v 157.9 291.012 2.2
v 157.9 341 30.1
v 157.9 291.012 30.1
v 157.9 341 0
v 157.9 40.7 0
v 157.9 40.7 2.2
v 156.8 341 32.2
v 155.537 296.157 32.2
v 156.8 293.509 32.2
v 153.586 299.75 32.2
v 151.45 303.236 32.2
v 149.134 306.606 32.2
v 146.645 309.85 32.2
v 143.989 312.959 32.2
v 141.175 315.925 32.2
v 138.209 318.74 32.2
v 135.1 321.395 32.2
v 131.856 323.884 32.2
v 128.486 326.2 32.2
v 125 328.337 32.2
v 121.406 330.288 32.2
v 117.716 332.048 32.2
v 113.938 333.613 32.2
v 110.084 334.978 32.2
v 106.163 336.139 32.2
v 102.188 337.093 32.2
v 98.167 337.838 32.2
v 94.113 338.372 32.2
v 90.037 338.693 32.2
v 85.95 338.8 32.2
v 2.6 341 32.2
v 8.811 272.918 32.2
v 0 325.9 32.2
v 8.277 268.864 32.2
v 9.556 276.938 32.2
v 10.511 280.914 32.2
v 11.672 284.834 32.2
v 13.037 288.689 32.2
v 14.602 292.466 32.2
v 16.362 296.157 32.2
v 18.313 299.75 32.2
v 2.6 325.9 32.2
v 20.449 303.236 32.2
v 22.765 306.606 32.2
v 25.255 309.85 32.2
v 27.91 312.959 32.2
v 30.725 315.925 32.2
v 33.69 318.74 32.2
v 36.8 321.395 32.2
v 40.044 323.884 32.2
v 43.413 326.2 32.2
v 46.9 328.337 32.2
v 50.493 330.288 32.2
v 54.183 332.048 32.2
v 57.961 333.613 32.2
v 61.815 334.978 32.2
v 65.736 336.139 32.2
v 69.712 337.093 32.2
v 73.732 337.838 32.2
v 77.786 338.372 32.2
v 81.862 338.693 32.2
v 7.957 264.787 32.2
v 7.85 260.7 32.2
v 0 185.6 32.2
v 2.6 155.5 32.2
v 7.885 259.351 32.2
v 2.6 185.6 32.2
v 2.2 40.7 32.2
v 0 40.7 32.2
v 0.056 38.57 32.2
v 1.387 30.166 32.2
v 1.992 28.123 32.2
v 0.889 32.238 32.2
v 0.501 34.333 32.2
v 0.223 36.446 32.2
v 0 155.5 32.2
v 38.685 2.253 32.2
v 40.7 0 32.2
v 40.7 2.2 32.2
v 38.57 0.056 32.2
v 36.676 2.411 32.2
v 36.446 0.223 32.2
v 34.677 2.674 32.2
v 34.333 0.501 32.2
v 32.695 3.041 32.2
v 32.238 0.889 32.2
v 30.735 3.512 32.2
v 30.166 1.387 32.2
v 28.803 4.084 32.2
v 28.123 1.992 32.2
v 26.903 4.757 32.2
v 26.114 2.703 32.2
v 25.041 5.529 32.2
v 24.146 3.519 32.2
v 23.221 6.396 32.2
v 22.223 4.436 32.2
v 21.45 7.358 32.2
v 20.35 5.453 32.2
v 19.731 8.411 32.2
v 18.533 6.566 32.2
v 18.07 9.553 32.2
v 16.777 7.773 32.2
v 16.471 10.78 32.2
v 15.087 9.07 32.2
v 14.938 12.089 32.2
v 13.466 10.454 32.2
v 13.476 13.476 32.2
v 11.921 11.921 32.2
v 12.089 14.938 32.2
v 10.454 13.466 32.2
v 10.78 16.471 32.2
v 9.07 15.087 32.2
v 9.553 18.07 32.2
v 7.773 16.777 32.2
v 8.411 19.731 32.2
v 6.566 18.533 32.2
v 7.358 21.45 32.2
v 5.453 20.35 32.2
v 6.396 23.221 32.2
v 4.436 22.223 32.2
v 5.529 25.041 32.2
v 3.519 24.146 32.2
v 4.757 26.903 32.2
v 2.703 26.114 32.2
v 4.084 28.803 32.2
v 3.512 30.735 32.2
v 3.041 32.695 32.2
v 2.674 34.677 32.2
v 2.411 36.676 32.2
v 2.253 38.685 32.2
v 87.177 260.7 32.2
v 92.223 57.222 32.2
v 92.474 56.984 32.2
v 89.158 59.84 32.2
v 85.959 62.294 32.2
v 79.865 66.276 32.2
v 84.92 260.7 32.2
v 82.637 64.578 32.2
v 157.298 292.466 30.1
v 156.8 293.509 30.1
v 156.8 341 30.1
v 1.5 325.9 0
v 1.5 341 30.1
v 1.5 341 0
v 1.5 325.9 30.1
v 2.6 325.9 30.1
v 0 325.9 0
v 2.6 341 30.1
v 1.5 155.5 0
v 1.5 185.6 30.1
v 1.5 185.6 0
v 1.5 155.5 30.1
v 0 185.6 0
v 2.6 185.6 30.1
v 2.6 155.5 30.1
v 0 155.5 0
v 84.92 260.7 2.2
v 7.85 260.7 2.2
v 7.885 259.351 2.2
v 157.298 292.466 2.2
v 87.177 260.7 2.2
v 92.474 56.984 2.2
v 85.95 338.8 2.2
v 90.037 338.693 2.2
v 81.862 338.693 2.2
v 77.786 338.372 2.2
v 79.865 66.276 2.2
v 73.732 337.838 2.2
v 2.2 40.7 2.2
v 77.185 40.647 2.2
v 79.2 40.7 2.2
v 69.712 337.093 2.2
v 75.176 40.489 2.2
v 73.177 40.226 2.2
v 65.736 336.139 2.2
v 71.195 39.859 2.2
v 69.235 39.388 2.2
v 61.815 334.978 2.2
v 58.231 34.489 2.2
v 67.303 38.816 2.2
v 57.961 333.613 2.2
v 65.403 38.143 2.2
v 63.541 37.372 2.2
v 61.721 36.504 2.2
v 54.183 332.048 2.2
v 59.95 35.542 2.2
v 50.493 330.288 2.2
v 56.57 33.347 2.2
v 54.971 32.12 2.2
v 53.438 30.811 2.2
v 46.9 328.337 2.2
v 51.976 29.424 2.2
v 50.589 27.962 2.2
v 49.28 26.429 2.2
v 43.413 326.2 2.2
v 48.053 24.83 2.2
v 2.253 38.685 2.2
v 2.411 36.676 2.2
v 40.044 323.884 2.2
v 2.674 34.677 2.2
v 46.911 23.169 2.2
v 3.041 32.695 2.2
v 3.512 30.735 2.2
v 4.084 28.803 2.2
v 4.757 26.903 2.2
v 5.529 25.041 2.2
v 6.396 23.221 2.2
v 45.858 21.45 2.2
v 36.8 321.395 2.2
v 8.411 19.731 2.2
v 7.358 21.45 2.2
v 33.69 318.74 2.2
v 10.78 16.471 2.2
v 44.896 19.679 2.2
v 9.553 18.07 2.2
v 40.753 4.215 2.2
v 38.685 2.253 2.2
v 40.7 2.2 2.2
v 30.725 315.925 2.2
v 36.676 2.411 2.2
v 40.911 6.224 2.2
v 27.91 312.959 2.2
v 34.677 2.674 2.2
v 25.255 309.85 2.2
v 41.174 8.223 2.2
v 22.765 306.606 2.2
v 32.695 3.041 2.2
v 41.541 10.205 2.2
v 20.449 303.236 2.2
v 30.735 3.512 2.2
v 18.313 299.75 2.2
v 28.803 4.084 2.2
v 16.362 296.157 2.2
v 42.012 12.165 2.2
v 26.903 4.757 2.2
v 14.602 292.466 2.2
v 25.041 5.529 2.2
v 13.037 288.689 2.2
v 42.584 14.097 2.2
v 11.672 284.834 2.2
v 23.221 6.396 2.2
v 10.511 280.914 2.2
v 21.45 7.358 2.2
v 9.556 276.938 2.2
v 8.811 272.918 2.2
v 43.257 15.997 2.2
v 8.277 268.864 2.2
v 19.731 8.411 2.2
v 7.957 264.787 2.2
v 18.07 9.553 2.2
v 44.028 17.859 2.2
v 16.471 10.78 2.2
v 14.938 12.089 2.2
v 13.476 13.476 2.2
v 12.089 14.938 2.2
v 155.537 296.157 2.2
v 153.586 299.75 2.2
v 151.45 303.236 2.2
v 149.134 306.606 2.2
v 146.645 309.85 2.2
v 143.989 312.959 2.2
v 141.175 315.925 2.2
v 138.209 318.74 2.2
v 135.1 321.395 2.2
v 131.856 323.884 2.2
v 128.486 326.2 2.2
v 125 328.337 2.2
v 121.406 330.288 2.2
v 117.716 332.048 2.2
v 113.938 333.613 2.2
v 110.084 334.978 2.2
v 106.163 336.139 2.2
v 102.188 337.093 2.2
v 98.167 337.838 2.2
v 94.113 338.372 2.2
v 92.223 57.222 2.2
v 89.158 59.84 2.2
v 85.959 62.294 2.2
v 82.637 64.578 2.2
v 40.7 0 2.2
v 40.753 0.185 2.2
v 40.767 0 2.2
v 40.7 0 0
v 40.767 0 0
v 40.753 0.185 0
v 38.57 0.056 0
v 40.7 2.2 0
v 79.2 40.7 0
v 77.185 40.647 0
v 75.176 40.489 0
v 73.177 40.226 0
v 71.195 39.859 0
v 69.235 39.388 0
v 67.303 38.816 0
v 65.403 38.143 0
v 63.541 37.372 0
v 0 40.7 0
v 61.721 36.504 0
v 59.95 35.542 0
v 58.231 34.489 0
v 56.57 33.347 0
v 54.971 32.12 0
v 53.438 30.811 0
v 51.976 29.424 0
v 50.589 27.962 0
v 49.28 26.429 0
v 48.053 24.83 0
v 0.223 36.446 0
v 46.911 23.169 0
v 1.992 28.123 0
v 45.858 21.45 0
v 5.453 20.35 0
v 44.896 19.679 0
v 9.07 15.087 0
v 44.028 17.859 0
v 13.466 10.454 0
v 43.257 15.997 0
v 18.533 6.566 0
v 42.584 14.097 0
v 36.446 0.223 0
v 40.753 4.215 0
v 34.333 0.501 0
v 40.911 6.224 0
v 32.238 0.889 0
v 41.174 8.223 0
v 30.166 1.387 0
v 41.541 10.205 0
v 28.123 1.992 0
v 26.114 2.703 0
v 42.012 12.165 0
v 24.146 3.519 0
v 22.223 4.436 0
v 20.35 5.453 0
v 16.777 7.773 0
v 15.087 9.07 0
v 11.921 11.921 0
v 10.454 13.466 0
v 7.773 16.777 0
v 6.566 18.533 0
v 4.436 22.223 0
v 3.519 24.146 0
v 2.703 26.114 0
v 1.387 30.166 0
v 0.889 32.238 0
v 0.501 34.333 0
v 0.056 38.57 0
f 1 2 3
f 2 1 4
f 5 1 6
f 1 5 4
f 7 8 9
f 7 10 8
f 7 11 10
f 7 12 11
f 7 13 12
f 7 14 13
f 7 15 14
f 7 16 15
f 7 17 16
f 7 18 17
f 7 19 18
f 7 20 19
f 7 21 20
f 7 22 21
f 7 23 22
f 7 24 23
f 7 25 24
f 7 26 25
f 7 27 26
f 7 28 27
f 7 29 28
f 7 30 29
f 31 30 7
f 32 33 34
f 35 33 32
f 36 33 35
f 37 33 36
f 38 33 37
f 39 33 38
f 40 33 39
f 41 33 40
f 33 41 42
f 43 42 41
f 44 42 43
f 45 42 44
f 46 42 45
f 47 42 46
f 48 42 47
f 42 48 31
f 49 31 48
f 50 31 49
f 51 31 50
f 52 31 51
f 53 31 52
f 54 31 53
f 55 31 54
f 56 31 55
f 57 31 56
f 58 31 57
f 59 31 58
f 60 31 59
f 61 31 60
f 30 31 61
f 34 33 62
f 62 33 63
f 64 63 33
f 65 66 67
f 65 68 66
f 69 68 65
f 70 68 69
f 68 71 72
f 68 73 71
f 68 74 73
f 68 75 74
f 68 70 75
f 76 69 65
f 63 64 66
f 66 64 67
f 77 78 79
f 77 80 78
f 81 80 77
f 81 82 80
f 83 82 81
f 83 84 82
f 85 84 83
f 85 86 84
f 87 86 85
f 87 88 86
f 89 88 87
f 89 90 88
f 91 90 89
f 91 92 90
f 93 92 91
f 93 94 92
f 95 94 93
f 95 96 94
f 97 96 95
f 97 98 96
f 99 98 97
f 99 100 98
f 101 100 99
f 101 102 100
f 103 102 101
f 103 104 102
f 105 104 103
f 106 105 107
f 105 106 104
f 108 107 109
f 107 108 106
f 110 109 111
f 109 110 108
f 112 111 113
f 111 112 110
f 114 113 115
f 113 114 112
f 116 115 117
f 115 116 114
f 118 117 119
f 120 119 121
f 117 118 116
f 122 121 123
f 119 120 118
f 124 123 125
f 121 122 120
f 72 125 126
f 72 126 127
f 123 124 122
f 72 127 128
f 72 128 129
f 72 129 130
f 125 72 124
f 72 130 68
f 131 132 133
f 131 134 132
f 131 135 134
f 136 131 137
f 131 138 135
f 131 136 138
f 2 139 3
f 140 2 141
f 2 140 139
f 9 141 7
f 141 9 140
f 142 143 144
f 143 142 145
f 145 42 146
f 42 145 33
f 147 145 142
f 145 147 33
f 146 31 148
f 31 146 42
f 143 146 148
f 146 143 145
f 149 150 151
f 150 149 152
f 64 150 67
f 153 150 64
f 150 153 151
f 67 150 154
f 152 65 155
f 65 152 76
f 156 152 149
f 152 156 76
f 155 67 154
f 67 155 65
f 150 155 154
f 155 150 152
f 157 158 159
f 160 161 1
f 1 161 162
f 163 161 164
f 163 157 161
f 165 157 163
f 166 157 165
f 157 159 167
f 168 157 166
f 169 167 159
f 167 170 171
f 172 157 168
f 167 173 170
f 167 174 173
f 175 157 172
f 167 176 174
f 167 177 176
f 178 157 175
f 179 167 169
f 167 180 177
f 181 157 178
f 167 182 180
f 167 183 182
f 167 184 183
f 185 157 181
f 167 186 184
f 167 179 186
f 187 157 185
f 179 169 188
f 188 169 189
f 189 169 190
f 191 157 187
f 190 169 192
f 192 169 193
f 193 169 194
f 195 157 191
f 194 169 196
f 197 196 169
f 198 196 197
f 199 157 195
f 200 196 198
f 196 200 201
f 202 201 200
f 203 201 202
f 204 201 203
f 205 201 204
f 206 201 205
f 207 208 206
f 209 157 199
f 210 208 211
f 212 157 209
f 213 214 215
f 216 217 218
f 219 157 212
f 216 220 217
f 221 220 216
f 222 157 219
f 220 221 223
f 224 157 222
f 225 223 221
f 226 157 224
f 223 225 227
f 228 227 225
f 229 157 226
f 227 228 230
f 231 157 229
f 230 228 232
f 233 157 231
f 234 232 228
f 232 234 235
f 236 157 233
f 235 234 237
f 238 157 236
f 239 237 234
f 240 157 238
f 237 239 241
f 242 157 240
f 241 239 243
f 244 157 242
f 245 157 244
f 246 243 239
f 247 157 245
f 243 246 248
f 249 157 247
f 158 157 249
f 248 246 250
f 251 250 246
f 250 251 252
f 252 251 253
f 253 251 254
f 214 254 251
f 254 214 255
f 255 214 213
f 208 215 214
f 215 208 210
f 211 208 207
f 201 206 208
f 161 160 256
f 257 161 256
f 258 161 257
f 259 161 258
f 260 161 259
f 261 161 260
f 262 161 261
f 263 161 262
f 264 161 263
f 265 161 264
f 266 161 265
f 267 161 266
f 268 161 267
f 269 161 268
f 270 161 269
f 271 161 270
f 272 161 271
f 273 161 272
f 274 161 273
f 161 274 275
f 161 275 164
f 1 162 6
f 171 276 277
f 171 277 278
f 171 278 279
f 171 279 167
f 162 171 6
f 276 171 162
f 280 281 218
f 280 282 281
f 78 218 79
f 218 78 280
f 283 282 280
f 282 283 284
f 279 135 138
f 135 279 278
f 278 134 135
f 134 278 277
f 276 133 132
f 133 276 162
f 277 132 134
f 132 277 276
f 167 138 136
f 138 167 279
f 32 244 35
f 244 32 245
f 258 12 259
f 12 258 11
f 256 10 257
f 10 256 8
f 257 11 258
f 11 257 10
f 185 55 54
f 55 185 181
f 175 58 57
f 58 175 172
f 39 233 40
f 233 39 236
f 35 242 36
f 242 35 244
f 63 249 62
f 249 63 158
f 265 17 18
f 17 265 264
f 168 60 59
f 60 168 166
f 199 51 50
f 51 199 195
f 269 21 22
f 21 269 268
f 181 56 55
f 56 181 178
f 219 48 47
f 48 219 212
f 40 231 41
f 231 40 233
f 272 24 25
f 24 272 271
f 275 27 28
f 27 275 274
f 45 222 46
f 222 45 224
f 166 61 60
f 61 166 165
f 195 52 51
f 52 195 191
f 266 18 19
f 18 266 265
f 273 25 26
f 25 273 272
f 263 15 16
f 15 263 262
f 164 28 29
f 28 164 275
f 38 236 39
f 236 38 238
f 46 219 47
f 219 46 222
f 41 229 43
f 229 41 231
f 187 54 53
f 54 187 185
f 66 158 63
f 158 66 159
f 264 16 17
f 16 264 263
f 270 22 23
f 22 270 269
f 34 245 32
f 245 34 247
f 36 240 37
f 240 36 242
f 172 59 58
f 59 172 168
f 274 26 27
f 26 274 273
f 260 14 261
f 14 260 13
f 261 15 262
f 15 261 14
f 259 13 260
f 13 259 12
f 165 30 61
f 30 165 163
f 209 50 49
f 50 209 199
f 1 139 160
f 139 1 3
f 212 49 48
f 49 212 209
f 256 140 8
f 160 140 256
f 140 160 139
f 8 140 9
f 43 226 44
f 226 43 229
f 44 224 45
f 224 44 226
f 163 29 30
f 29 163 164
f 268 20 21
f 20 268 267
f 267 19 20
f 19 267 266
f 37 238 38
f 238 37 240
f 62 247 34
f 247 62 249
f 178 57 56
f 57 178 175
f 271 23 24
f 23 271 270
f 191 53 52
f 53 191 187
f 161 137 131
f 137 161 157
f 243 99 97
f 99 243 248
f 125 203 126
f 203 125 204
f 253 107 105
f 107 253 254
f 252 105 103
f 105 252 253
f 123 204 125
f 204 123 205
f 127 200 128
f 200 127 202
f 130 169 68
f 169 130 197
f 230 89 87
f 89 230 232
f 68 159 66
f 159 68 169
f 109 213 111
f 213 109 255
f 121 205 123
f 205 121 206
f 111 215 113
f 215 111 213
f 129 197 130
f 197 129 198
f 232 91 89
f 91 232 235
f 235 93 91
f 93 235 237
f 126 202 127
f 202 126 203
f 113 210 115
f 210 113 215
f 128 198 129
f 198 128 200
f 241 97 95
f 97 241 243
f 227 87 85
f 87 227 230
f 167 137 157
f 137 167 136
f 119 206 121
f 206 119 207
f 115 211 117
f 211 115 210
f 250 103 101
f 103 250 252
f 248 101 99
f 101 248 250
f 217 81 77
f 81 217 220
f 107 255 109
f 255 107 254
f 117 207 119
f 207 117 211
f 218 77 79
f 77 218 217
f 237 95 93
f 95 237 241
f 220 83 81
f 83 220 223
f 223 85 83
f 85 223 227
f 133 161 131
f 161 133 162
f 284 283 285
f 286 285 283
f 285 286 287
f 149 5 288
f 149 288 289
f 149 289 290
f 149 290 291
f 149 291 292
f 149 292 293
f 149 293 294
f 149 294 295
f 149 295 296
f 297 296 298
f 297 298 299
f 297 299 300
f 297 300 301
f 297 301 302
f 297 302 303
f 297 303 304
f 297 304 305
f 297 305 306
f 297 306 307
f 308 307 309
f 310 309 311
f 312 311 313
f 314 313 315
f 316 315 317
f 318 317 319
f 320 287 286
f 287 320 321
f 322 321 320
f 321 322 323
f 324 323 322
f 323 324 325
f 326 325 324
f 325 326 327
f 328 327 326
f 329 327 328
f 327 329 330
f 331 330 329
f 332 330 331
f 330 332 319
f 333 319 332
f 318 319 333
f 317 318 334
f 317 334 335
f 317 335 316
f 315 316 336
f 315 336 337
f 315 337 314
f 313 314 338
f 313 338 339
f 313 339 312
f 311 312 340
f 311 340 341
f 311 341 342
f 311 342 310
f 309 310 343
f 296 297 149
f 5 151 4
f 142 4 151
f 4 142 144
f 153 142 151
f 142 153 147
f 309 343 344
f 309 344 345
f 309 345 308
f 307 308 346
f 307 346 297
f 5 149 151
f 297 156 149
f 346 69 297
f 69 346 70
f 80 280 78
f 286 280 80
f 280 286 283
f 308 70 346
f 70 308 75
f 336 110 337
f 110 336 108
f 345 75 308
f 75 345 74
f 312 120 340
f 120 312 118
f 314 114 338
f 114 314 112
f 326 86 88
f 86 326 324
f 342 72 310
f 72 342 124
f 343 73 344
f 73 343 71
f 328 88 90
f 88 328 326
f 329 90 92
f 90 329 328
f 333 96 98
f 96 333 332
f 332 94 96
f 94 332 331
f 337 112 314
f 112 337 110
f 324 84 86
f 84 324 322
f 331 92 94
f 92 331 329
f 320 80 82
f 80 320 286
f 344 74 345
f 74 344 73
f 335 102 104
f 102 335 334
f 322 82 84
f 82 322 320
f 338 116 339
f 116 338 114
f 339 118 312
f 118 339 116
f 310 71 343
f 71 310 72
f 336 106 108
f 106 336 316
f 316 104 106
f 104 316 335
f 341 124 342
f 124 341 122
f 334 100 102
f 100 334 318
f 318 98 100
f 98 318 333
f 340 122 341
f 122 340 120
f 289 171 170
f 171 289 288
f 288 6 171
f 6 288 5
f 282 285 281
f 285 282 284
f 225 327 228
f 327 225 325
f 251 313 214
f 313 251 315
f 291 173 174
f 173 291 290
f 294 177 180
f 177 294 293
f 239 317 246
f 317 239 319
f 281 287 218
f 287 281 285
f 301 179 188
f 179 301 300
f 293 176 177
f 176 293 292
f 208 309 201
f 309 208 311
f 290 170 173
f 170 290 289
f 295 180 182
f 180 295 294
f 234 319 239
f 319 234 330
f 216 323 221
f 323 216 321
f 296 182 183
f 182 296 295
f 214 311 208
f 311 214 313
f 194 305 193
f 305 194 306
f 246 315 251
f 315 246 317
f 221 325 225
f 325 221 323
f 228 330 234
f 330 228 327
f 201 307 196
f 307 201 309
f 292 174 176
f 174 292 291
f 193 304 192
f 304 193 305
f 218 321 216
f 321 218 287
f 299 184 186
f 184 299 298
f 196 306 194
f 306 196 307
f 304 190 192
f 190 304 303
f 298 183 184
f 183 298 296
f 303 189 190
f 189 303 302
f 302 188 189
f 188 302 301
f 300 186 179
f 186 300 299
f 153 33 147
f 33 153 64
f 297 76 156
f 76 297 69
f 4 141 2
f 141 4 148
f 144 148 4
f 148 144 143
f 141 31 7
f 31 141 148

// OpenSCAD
/*
FourOhFour
2018-03-08

License: http://creativecommons.org/licenses/by-sa/4.0/

A can dispenser for your fridge. Print two sides (mirror one in your slicer),
one set of supports for the bottom, and a top shelf. Half sides and top provided
if, like me, you don't have a large printer. If you aren't going to place items
on top of the dispenser, you can save some plastic and replace the top shelf
with another set of supports.

*/

/* [Can Dimensions] */
// Diameter of the can, mm
can_diameter = 75;

// Height of the can, mm
can_height = 108.8;

// How far from the edge should the can be supported, mm
can_support_height = 30;

/* [Dispenser Dimensions] */
// depth of dispenser, mm
depth = 341;

// height of dispenser, mm
height = 160;

// how far from the front does the top shelf begin, mm
shelf_y = 100;

// which object?
part = "fullside"; // [fullside:Entire side piece, frontside:Front half of side, rearside:Rear half of side, supports, top, halftop:Half of top, topcutout:STL for slic3r to make top for full top mesh, halftopcutout:STL for top mesh for half top]

/* [Rear Notch] */
//notch out the bottom rear corner to avoid a rim on the fridge shelf?
should_notch_rear = false;
rear_notch_height = 33;
rear_notch_depth = 9;


/* [Nitpicky Details] */
// min wall thickness, mm
wall_thickness = 2.2;

// top shelf thickness, mm
top_thickness = 2;

// size of the bottom braces, mm
bottom_brace_width = 15;

// bottom brace thickness, mm
bottom_brace_thickness = 1.4;

// slope of ramps, percent
slope_angle = .026;

// extra space in assembly slots, mm
assembly_slack = .10;

// extra thickness for the middle of bottom braces and top, mm
brace_middle_addl_thickness = 1;

// how much should the thicker middle overlap the sides, mm
brace_middle_extra_width = 2;

// ammount to add to the size of the can, mm
slack = 2;

// render quality, lower better, min 0.01 def 12
$fa = 3;

track_radius = (can_diameter + slack) / 2;

module can_track(slope_dir) {
  y = depth - 3 * track_radius - 2 * wall_thickness;
  hull() {
    cylinder(h = can_support_height, r = track_radius);
    translate([y * slope_angle * slope_dir, y, 0]) {
      cylinder(h = can_support_height + .1, r = track_radius);
    // adding some to height to make the preview render better
    }
  }
}

module support_inset(y, face) {
  thickness = (face == 1 ? top_thickness : bottom_brace_thickness);
  translate([(face == 1 ? 0 : -.1), 0, -1])
    cube([thickness + assembly_slack + .1, y, can_support_height + wall_thickness + 2]);
  translate([-face * assembly_slack - (face == 1 ? brace_middle_addl_thickness : -thickness), 0, can_support_height + wall_thickness - brace_middle_extra_width - assembly_slack]) {
    cube([assembly_slack + brace_middle_addl_thickness, y, assembly_slack + brace_middle_extra_width]);
  }
}

module support_piece(width, thickness) {
  support_length = can_height + slack;
  union() {
    cube([support_length + 2 * wall_thickness, width, thickness]);
    translate([wall_thickness + can_support_height - brace_middle_extra_width, 0, thickness]) {
      cube([support_length - 2 * can_support_height + 2 * brace_middle_extra_width, width, brace_middle_addl_thickness]);
    }
  }
}

module finger_cutout() {
  translate([track_radius, -track_radius, -wall_thickness - .2]) {
    hull() {
      cylinder(h = can_support_height + 2 * wall_thickness, r = track_radius);
      translate([height, 0, 0])
        cylinder(h = can_support_height + 2 * wall_thickness, r = track_radius);
    }
  }
}

module can_path() {
  can_track(1); // lower track, slope up towards rear

  // cutout for can removal
  translate([0, -track_radius - wall_thickness, 0]) {
    intersection() {
      cube([2 * track_radius, 2 * track_radius, can_support_height + .1]);
      cylinder(h = can_support_height + .1, r = 2 * track_radius);
    }
  }

  translate([(depth - 3 * track_radius - 2 * wall_thickness) * slope_angle * 2 + 2 * track_radius + wall_thickness, 0, 0]) {
    /*translate([-(depth-track_radius)*slope_angle,track_radius,0])
    finger_cutout();*/
    can_track(-1); // upper track, slope down towards rear
  }

  // switchback
  translate([(depth - 2 * track_radius - 2 * wall_thickness) * slope_angle + track_radius, depth - 3 * track_radius - 2.5 * wall_thickness, 0]) {
    difference() {
      // additional height so preview renders better
      cylinder(h = can_support_height + .1, r = 2 * track_radius + wall_thickness / 2);
      translate([-2 * track_radius, -2 * track_radius - wall_thickness, -5]) {
        cube([4 * track_radius, 2 * track_radius + wall_thickness, can_support_height + 5], false);
      }
    }
  }
}

module dispenser_splitter() {
  translate([-1, -1, -1]) { // move away from origin so preview doesn't flicker
    midpoint_x = height / 2 + 1; // account for the previous line
    midpoint_y = depth / 2 + 1;
    linear_extrude(height = can_support_height + wall_thickness + 2)
      polygon(points = [
        [0, 0], 
        [0, midpoint_y], 
        [midpoint_x, midpoint_y], 
        [midpoint_x, midpoint_y - bottom_brace_width], 
        [height + 2, midpoint_y - bottom_brace_width], 
        [height + 2, 0]
      ]);
  }
}

module can_dispenser() {
  difference() {
    cube([height, depth, can_support_height + wall_thickness]);

    // rear notch
    if (should_notch_rear) {
      translate([0, depth - rear_notch_depth, 0]) {
        cube([rear_notch_height, rear_notch_depth, can_support_height + wall_thickness]);
      }
    }

    // slot for top shelf
    translate([height - top_thickness - assembly_slack, track_radius + wall_thickness - .01, 0]) {
      support_inset(depth - track_radius - wall_thickness + .02, 1); //facing right
    }

    // slots for bottom braces
    translate([0, depth - bottom_brace_width - assembly_slack - (should_notch_rear ? rear_notch_depth : 0), 0]) {
      support_inset(bottom_brace_width + assembly_slack + .1, -1);
    }
    translate([0, depth / 2 - bottom_brace_width, 0]) {
      support_inset(2 * bottom_brace_width + assembly_slack, -1);
    }

    // can path
    translate([track_radius + wall_thickness, track_radius + wall_thickness, wall_thickness]) {
      finger_cutout();
      can_path();

      // rounded lower corner
      translate([0, 0, -wall_thickness])
        intersection() {
          translate([-2 * track_radius, -2 * track_radius, 0])
            cube([track_radius * 2, track_radius * 2, can_support_height + wall_thickness]);
          difference() {
            cylinder(h = can_support_height + wall_thickness, r = 2 * track_radius);
            cylinder(h = can_support_height + wall_thickness, r = track_radius + wall_thickness);
          }
        }
    }
  }
}

if (part == "fullside" || part == "frontside" || part == "rearside") {
  // printing only half?
  if (part == "fullside") {
    can_dispenser();
  } else if (part == "frontside") {
    intersection() {
      can_dispenser();
      dispenser_splitter();
    }
  } else {
    difference() {
      can_dispenser();
      dispenser_splitter();
    }
  }
} else if (part == "supports") {
  support_piece(bottom_brace_width, bottom_brace_thickness);

  translate([0, bottom_brace_width + 5, 0])
    support_piece(2 * bottom_brace_width, bottom_brace_thickness);
} else if (part == "top") {
  support_piece(depth - track_radius - wall_thickness, top_thickness);
} else if (part == "halftop") {
  support_piece((depth - track_radius - wall_thickness) / 2, top_thickness);
} else if (part == "topcutout") {
  translate([can_support_height + wall_thickness, 0, 0])
    cube([can_height + slack - 2 * can_support_height, depth - track_radius - wall_thickness, top_thickness + brace_middle_addl_thickness]);
} else if (part == "halftopcutout") {
  translate([can_support_height + wall_thickness, 0, 0])
    cube([can_height + slack - 2 * can_support_height, (depth - track_radius - wall_thickness) / 2, top_thickness + brace_middle_addl_thickness]);
} else {
  translate([track_radius + wall_thickness, track_radius + wall_thickness, -(can_support_height / 2)])
    can_path();
}
